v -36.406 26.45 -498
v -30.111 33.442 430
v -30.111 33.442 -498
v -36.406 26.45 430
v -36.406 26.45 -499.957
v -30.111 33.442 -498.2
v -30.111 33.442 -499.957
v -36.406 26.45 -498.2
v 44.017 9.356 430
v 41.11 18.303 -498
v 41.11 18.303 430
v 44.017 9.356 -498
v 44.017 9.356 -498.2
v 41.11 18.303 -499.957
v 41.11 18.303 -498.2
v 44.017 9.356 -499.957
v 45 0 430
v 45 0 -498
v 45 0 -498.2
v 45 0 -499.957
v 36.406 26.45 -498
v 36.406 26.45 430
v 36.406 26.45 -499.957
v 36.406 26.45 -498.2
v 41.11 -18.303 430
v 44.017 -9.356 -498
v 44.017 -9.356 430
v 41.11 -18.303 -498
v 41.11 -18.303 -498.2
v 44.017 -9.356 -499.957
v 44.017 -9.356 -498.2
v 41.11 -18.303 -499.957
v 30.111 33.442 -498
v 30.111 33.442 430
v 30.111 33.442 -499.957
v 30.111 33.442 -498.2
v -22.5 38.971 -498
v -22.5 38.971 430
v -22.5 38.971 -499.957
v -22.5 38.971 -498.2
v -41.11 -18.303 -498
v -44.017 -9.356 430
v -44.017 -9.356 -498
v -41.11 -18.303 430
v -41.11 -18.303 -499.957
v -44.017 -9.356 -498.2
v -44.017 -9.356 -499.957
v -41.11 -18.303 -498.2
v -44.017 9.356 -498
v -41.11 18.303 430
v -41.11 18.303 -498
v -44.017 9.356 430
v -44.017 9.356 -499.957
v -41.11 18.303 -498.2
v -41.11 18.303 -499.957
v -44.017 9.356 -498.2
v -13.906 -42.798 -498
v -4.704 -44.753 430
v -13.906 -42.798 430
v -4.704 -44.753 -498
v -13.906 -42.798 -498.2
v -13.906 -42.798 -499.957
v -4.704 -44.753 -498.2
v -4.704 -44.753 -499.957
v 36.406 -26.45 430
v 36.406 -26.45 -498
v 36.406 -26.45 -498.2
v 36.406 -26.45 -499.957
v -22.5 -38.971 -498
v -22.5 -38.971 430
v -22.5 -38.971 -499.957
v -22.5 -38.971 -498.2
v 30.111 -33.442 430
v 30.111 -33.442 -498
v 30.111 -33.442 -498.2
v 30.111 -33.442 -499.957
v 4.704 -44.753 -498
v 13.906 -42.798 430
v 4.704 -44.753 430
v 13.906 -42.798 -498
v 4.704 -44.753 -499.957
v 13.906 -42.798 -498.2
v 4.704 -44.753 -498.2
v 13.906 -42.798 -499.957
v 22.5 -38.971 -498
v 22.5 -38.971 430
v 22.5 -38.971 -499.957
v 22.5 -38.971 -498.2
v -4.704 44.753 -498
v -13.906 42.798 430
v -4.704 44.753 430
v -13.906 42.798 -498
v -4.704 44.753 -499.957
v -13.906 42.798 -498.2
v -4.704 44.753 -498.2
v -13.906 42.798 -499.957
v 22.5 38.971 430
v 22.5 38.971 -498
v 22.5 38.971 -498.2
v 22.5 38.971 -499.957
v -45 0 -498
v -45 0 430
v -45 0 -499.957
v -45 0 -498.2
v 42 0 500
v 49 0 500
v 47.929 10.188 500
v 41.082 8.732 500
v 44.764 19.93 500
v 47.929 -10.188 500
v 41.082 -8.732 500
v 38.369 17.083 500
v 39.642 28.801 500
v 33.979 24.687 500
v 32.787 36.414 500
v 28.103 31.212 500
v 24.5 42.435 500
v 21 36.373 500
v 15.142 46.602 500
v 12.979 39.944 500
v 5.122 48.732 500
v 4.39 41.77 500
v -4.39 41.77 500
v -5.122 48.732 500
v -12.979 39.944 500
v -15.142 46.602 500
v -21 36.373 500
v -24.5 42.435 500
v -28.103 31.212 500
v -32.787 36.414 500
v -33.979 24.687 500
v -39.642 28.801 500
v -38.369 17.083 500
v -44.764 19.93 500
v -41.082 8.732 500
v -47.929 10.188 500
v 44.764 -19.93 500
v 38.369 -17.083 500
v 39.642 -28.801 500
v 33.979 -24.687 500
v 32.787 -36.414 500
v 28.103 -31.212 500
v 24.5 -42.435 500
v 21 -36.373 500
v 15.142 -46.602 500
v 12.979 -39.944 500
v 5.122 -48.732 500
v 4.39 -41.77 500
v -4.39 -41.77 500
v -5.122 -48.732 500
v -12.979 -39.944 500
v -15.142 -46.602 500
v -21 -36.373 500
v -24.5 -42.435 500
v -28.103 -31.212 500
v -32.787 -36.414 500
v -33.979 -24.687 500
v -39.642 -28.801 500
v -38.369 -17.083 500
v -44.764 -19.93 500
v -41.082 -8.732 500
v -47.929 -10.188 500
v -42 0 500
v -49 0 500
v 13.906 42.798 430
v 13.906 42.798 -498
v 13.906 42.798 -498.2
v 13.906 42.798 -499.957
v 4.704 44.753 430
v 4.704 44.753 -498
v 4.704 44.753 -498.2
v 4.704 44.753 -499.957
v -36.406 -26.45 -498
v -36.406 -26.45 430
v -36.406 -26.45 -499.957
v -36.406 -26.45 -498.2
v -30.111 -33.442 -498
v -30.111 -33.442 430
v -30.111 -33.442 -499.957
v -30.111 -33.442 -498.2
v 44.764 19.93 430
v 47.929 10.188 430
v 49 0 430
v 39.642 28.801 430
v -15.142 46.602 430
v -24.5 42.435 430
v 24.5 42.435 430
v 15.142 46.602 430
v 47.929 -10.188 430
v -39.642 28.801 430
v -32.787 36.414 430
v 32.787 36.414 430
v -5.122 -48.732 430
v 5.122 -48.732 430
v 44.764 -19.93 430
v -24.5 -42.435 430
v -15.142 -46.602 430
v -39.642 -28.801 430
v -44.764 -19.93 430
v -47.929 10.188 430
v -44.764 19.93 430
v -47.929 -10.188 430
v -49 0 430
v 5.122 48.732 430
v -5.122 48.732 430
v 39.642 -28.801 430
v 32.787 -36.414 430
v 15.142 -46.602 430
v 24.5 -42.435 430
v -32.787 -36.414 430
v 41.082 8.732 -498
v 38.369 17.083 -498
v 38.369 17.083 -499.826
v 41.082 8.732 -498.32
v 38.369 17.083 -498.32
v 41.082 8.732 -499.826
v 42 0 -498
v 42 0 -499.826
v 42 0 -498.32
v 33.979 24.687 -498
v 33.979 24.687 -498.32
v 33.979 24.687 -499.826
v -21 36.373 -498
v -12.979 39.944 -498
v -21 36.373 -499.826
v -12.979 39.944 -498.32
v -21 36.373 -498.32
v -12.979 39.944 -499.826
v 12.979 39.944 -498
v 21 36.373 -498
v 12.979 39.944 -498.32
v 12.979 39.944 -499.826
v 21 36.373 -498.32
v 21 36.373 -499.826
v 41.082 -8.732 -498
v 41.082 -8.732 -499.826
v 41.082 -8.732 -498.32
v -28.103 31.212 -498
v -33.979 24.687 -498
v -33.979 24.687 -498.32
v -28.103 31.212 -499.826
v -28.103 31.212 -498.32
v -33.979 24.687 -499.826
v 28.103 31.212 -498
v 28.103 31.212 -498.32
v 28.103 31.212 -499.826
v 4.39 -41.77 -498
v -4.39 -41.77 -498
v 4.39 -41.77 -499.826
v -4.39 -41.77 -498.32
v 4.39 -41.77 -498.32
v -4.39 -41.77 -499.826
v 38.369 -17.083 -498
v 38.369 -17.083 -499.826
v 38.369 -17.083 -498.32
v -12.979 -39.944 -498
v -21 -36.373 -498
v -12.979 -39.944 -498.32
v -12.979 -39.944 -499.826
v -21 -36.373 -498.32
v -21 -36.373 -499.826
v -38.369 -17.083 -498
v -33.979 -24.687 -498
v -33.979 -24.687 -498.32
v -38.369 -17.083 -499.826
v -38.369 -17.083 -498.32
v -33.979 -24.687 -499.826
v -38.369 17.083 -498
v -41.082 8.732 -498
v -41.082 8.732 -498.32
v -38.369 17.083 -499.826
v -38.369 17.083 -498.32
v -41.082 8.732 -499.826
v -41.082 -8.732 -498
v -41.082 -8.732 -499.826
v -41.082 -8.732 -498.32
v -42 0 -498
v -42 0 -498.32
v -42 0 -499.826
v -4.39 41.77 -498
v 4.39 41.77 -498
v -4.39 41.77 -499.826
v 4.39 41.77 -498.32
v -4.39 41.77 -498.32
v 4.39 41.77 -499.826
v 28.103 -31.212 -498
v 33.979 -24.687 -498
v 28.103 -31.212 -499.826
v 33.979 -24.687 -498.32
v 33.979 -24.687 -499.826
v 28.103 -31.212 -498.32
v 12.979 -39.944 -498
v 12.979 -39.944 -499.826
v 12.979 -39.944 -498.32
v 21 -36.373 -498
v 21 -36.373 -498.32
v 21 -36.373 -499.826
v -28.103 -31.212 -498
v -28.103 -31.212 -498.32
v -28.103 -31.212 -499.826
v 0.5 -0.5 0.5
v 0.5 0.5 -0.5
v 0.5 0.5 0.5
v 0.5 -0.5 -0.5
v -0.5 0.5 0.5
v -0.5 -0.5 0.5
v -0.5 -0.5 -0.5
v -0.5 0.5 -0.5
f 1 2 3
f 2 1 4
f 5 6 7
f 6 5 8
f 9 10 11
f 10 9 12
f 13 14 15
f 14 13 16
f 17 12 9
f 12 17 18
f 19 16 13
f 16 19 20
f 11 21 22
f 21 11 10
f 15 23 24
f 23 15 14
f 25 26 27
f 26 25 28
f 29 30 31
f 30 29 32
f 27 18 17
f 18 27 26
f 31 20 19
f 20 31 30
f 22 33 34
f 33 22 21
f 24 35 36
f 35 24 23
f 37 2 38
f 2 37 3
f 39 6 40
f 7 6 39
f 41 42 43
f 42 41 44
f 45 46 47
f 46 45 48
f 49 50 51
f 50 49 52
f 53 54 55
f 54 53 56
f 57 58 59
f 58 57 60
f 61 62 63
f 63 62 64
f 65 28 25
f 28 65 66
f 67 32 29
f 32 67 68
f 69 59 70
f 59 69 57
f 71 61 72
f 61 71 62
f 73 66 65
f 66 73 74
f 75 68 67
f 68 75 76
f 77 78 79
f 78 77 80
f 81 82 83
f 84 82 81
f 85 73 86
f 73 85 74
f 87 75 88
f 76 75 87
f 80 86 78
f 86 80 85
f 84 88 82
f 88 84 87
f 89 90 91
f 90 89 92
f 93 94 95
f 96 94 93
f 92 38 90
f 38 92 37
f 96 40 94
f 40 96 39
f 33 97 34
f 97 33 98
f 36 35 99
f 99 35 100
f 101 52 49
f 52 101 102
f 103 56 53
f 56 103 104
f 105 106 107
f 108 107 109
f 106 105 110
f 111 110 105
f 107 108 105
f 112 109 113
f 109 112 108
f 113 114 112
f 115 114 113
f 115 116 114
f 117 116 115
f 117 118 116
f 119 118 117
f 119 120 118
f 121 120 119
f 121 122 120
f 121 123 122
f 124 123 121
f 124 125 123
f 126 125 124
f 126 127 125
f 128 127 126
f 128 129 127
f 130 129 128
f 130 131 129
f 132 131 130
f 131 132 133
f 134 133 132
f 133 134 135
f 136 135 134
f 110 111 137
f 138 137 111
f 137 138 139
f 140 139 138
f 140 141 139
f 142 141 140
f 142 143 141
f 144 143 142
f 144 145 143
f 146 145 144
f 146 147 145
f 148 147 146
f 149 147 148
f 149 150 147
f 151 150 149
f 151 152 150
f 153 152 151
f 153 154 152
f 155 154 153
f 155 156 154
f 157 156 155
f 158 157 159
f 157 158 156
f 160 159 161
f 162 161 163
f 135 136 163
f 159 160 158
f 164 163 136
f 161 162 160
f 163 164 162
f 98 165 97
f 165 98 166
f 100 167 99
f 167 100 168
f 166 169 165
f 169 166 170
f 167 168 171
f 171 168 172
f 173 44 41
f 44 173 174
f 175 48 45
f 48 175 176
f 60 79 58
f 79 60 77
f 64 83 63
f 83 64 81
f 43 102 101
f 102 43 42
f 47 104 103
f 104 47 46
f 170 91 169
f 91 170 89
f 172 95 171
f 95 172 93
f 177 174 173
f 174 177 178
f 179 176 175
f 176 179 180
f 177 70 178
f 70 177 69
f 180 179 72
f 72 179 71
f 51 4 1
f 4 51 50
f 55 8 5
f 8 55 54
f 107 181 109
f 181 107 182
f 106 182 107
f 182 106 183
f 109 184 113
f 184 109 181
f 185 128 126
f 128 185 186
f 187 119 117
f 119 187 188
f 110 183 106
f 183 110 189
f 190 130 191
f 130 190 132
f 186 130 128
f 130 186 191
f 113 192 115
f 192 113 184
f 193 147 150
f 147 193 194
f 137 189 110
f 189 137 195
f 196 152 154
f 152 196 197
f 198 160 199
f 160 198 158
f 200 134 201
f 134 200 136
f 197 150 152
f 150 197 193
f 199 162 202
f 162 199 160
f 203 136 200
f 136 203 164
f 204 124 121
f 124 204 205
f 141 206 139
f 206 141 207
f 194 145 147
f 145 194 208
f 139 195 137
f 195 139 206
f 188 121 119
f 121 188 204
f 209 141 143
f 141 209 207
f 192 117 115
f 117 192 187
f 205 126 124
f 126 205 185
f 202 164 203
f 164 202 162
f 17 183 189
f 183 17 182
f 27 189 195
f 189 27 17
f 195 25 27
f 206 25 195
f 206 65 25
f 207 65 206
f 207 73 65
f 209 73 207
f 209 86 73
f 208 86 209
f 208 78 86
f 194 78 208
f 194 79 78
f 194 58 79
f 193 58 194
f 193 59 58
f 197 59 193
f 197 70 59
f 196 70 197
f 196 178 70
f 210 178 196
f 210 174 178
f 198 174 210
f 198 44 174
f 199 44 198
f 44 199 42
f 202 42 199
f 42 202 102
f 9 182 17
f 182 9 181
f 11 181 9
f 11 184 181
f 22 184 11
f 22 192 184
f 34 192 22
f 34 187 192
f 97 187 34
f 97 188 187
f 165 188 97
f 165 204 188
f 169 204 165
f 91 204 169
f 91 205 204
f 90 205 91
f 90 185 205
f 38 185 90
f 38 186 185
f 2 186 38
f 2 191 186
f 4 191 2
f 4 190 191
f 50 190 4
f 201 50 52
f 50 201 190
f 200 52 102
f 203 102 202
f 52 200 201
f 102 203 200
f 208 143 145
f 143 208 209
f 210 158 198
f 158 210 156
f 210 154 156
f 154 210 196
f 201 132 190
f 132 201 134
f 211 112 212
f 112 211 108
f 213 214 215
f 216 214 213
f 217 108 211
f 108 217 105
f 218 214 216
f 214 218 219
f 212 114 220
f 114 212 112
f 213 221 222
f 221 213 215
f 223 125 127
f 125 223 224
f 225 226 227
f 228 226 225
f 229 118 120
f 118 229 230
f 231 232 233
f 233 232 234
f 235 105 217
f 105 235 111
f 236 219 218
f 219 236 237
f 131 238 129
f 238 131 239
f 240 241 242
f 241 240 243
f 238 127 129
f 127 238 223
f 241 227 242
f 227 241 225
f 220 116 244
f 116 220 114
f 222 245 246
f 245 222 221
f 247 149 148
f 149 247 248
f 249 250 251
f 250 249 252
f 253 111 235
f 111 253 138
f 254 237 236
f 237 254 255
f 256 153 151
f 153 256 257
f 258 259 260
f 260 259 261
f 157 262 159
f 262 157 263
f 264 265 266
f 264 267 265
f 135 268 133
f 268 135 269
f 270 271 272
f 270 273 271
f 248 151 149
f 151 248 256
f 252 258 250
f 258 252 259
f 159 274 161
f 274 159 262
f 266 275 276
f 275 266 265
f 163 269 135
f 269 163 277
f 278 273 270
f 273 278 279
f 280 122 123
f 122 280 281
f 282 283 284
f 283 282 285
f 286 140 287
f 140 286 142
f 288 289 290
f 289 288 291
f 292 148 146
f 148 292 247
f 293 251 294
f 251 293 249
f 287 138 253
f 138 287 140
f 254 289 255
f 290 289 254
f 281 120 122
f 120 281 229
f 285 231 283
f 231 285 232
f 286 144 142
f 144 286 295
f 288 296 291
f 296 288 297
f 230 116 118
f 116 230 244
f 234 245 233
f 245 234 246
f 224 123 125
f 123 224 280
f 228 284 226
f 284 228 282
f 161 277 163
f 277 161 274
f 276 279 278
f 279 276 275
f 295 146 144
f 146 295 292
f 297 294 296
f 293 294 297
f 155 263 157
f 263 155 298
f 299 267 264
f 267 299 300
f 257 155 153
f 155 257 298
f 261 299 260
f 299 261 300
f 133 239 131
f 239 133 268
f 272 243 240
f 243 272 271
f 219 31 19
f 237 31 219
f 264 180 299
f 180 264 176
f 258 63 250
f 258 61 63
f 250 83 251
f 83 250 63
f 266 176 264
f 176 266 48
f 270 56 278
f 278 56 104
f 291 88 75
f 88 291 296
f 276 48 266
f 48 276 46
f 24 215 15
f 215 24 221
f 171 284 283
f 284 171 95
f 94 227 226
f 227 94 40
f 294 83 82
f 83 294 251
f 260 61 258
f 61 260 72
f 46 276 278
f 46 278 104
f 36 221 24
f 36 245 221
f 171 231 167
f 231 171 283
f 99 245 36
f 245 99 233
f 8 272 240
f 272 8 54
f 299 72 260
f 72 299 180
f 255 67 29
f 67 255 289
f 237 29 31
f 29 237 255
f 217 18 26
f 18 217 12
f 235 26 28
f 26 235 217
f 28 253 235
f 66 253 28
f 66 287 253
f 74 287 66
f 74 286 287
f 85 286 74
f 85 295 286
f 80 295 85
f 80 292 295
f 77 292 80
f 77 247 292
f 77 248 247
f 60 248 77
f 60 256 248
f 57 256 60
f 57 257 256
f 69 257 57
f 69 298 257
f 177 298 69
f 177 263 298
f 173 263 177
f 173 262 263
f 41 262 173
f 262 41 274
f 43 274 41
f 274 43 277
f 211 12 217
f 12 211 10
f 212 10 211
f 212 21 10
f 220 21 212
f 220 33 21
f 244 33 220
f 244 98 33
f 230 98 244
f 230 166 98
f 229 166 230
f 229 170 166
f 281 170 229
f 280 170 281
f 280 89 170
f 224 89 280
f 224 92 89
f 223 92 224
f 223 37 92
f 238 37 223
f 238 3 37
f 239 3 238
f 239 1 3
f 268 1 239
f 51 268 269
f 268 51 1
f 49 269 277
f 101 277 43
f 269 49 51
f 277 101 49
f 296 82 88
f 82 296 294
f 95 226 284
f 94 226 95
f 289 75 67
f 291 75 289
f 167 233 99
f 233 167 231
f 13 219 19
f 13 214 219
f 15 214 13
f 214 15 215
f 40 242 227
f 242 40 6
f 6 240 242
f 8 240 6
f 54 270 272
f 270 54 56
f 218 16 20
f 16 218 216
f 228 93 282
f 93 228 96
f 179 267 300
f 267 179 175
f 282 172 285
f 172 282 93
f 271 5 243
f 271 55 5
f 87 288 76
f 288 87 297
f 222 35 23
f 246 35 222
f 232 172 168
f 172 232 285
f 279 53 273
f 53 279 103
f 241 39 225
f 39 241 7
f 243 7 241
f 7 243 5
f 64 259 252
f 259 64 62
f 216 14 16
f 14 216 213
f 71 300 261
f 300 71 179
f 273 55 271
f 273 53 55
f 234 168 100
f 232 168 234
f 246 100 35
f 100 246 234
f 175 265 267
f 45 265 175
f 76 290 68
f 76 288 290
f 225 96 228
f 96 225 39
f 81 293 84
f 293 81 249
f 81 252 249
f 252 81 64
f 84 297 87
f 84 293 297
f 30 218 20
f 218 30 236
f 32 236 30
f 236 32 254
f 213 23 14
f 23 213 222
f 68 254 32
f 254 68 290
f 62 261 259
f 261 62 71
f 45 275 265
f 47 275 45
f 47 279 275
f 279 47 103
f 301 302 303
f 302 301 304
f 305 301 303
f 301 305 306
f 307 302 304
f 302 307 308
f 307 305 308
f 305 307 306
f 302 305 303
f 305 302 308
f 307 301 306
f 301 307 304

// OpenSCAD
// Parameters
pipe_length = 1000; //[500:2000:1]
outer_diameter = 90; //[45:180:1]
wall_thickness = 3; //[1.5:6:0.1]
socket_enabled = 1; //[0:1:1]
socket_length = 70; //[35:140:1]
socket_radial_expansion = 4; //[0:10:0.5]
socket_wall_extra = 1; //[0:3:0.1]
chamfer_length = 2; //[0.5:6:0.5]
overlap = 1; //[0.5:2:0.1]

// Base Shapes
module pipe_body() {
  cylinder(h = pipe_length, r = outer_diameter / 2, center = true);
}

module hollow_bore() {
  cylinder(h = pipe_length + 2 * overlap, r = outer_diameter / 2 - wall_thickness, center = true);
}

module socket_end() {
  cylinder(h = socket_length * socket_enabled, r = outer_diameter / 2 + socket_radial_expansion * socket_enabled, center = true);
}

module socket_bore() {
  cylinder(h = socket_length * socket_enabled + 2 * overlap, r = outer_diameter / 2 - wall_thickness - socket_wall_extra * socket_enabled, center = true);
}

module chamfer_cone_pos() {
  rotate([180, 0, 0])
    translate([0, 0, pipe_length / 2 - chamfer_length / 2])
      cylinder(h = chamfer_length, r1 = outer_diameter / 2 + socket_radial_expansion * socket_enabled + overlap, r2 = 0, center = true);
}

module chamfer_cone_neg() {
  translate([0, 0, -pipe_length / 2 + chamfer_length / 2])
    cylinder(h = chamfer_length, r1 = outer_diameter / 2 + overlap, r2 = 0, center = true);
}

module marking_text() {
  cube([overlap, overlap, overlap], center = true);
}

// Operations
module pipe_outer_with_socket() {
  union() {
    pipe_body();
    translate([0, 0, pipe_length / 2 - (socket_length * socket_enabled) / 2]) socket_end();
  }
}

module pipe_wall() {
  difference() {
    pipe_outer_with_socket();
    hollow_bore();
    translate([0, 0, pipe_length / 2 - (socket_length * socket_enabled) / 2]) socket_bore();
  }
}

module end_chamfers() {
  difference() {
    pipe_wall();
    chamfer_cone_pos();
    chamfer_cone_neg();
  }
}

module final_model() {
  union() {
    end_chamfers();
    marking_text();
  }
}

// Final Output
color("DimGray") final_model();
